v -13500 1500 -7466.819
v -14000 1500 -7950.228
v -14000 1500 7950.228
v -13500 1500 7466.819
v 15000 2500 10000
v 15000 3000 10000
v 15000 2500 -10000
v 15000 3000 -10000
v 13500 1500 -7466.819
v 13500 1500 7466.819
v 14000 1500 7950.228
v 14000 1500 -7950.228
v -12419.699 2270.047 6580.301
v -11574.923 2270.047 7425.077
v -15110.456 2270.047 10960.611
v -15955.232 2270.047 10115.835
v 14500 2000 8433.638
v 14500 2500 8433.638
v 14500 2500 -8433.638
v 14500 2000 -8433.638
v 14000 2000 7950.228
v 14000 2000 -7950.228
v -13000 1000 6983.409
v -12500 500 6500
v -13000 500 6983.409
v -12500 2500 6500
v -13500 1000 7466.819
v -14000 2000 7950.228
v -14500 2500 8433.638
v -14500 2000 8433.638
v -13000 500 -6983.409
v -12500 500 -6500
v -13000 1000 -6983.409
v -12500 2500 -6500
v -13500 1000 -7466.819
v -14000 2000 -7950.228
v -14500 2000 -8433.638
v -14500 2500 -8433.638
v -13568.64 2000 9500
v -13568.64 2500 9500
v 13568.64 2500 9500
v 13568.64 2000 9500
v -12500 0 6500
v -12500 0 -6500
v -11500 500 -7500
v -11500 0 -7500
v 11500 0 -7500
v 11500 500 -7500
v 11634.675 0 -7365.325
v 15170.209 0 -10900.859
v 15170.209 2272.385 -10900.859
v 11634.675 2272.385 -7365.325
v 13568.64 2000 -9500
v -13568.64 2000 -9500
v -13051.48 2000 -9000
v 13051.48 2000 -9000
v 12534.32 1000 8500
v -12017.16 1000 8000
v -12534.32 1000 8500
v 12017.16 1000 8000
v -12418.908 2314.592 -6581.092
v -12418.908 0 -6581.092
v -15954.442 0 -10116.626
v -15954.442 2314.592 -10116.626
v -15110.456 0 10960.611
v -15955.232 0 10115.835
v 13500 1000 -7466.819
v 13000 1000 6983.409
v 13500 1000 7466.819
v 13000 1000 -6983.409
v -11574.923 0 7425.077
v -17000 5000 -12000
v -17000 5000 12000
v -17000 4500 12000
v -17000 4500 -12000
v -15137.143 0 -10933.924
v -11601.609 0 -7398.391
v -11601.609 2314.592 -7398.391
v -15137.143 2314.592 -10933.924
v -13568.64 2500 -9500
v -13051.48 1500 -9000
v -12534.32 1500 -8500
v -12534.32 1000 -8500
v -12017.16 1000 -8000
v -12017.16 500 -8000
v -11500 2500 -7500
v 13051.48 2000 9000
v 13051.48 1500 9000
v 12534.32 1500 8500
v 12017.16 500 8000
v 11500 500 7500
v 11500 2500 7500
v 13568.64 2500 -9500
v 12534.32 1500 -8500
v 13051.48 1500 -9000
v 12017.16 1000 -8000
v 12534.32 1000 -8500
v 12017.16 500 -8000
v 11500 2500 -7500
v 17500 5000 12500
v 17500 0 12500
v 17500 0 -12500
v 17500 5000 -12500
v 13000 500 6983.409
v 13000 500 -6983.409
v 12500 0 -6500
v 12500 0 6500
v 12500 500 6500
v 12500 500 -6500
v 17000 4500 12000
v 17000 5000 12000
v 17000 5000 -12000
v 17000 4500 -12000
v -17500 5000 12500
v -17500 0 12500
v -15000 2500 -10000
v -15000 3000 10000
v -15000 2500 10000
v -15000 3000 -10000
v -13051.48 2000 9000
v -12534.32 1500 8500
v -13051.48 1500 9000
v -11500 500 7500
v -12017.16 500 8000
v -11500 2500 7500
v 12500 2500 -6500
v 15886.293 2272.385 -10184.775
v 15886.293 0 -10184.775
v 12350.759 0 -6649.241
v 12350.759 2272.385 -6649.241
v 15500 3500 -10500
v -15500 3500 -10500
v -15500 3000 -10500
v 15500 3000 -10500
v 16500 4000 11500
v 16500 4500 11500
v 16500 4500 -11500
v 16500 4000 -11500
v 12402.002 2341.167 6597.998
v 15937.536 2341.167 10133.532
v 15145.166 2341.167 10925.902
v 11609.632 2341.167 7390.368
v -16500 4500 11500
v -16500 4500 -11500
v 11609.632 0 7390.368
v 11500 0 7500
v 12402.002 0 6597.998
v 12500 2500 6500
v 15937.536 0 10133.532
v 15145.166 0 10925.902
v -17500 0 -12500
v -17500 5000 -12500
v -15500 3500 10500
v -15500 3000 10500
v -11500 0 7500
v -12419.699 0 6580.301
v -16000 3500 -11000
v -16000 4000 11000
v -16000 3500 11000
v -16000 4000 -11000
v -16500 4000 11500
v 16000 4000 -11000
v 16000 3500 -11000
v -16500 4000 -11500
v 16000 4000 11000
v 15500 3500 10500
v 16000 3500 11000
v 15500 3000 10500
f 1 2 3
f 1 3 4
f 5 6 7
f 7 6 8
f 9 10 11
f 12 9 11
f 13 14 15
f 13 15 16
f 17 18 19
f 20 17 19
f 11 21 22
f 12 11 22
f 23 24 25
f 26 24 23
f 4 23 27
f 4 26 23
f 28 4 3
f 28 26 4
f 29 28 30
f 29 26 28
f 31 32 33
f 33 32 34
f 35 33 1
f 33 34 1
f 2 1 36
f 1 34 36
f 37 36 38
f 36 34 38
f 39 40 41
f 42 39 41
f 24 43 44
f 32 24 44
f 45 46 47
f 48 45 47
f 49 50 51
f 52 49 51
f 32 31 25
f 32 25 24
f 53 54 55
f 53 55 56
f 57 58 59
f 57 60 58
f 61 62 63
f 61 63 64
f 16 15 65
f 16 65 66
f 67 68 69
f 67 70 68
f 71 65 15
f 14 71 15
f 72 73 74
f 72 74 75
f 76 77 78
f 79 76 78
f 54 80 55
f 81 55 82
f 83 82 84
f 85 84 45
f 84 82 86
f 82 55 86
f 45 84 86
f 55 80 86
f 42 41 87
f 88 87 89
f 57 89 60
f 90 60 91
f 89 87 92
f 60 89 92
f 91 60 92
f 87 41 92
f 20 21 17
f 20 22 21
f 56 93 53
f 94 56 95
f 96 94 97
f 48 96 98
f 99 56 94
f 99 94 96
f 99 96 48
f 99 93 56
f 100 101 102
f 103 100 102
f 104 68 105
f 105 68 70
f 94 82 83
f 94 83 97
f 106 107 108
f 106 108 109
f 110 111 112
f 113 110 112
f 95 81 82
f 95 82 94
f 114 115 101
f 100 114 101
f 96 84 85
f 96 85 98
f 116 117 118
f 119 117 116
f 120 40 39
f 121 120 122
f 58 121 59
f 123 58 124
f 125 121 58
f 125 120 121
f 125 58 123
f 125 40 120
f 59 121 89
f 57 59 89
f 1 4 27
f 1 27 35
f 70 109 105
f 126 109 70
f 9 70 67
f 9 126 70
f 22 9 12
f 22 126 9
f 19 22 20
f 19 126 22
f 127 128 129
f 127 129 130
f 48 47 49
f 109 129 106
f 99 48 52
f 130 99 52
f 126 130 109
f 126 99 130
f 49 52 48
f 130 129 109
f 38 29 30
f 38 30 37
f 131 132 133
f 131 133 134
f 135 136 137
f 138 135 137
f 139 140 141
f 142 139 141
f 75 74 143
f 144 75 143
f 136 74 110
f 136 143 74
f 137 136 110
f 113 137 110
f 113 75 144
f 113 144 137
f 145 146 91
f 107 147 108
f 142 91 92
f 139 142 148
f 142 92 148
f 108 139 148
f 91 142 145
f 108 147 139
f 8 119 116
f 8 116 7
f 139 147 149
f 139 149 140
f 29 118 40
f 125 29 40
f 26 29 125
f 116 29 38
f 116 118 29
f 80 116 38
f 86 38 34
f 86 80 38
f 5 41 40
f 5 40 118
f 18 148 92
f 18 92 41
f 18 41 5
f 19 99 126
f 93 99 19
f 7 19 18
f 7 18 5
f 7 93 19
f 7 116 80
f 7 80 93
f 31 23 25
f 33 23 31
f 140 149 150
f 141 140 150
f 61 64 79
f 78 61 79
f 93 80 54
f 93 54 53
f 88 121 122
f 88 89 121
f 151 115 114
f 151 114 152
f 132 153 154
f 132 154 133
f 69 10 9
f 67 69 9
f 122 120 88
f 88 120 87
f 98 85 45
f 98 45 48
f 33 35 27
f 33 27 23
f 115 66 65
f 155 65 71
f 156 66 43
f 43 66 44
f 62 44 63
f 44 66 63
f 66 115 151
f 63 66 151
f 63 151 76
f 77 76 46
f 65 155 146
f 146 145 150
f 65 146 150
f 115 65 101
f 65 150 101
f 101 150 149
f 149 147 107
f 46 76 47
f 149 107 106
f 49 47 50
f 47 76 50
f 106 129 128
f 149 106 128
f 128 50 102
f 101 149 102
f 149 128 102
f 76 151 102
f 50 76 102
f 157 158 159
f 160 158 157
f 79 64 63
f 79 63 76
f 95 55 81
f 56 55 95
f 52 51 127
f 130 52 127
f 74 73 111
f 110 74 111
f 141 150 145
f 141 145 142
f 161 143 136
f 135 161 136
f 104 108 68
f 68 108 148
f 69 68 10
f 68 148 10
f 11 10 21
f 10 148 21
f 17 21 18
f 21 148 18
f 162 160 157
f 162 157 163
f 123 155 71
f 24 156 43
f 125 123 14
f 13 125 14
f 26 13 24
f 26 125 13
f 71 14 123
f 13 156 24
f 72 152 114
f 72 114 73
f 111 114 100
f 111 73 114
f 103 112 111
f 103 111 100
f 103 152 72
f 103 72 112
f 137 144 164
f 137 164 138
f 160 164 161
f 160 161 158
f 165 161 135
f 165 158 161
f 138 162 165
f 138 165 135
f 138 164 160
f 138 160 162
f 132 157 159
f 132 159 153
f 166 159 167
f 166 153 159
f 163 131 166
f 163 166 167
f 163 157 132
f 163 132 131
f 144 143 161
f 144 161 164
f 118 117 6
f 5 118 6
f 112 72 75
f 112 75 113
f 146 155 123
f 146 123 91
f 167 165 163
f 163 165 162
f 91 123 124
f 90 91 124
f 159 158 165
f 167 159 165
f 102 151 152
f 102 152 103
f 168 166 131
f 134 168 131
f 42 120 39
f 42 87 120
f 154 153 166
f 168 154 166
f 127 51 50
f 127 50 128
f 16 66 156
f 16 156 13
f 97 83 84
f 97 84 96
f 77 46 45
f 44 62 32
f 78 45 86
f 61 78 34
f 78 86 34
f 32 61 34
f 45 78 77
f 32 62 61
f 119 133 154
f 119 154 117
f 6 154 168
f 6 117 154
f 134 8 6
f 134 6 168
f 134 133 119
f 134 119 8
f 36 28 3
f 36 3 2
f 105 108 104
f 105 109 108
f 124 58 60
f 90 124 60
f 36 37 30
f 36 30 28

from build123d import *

# Parameters (mm, degrees)
ESQUISSE1_W              = 35000
ESQUISSE1_H              = 25000
ESQUISSE1_W_2            = 25000
ESQUISSE1_H_2            = 15000
BOSS_EXTRU_2_DEPTH       = 5000
ESQUISSE2_W              = 34000
ESQUISSE2_H              = 24000
ENL_V_MAT_EXTRU_1_DEPTH  = 500
ESQUISSE3_W              = 33000
ESQUISSE3_H              = 23000
ENL_V_MAT_EXTRU_2_DEPTH  = 500
ESQUISSE4_W              = 32000
ESQUISSE4_H              = 22000
ENL_V_MAT_EXTRU_3_DEPTH  = 500
ESQUISSE5_W              = 31000
ESQUISSE5_H              = 21000
ENL_V_MAT_EXTRU_4_DEPTH  = 500
ESQUISSE6_W              = 30000
ESQUISSE6_H              = 20000
ENL_V_MAT_EXTRU_5_DEPTH  = 500
ESQUISSE7_W              = 29000
ESQUISSE7_H              = 19000
ENL_V_MAT_EXTRU_6_DEPTH  = 500
ESQUISSE8_W              = 28000
ESQUISSE8_H              = 18000
ENL_V_MAT_EXTRU_7_DEPTH  = 500
ESQUISSE9_W              = 27000
ESQUISSE9_H              = 17000
ENL_V_MAT_EXTRU_8_DEPTH  = 500
ESQUISSE10_W             = 26000
ESQUISSE10_H             = 16000
ENL_V_MAT_EXTRU_9_DEPTH  = 500
BOSS_EXTRU_4_DEPTH       = 2500
ESQUISSE12_W             = 1012.695529181
ESQUISSE12_H             = 2272.385117154
ENL_V_MAT_EXTRU_10_DEPTH = 5000
ESQUISSE13_W             = 1120.580742395
ESQUISSE13_H             = 2341.167166511
ENL_V_MAT_EXTRU_11_DEPTH = 5000
ESQUISSE14_W             = 1194.693774878
ESQUISSE14_H             = 2270.046539735
ENL_V_MAT_EXTRU_12_DEPTH = 5000
ESQUISSE15_W             = 1155.834149298
ESQUISSE15_H             = 2314.592107333
ENL_V_MAT_EXTRU_14_DEPTH = 5000


with BuildPart() as part:
    # Esquisse1 → Boss.-Extru.2 (new body)
    with BuildSketch(Plane(origin=(0, 0, 0), x_dir=(1, 0, 0), z_dir=(0, 1, 0))):
        Rectangle(ESQUISSE1_W, ESQUISSE1_H)
        Rectangle(ESQUISSE1_W_2, ESQUISSE1_H_2, mode=Mode.SUBTRACT)
    extrude(amount=BOSS_EXTRU_2_DEPTH)

    # Esquisse2 → Enlèv. mat.-Extru.1 (cut)
    with BuildSketch(Plane(origin=(0, 5000, 0), x_dir=(1, 0, 0), z_dir=(0, 1, 0))):
        Rectangle(ESQUISSE2_W, ESQUISSE2_H)
    extrude(amount=-ENL_V_MAT_EXTRU_1_DEPTH, mode=Mode.SUBTRACT)

    # Esquisse3 → Enlèv. mat.-Extru.2 (cut)
    with BuildSketch(Plane(origin=(0, 4500, 0), x_dir=(1, 0, 0), z_dir=(0, 1, 0))):
        Rectangle(ESQUISSE3_W, ESQUISSE3_H)
    extrude(amount=-ENL_V_MAT_EXTRU_2_DEPTH, mode=Mode.SUBTRACT)

    # Esquisse4 → Enlèv. mat.-Extru.3 (cut)
    with BuildSketch(Plane(origin=(0, 4000, 0), x_dir=(1, 0, 0), z_dir=(0, 1, 0))):
        Rectangle(ESQUISSE4_W, ESQUISSE4_H)
    extrude(amount=-ENL_V_MAT_EXTRU_3_DEPTH, mode=Mode.SUBTRACT)

    # Esquisse5 → Enlèv. mat.-Extru.4 (cut)
    with BuildSketch(Plane(origin=(0, 3500, 0), x_dir=(1, 0, 0), z_dir=(0, 1, 0))):
        Rectangle(ESQUISSE5_W, ESQUISSE5_H)
    extrude(amount=-ENL_V_MAT_EXTRU_4_DEPTH, mode=Mode.SUBTRACT)

    # Esquisse6 → Enlèv. mat.-Extru.5 (cut)
    with BuildSketch(Plane(origin=(0, 3000, 0), x_dir=(1, 0, 0), z_dir=(0, 1, 0))):
        Rectangle(ESQUISSE6_W, ESQUISSE6_H)
    extrude(amount=-ENL_V_MAT_EXTRU_5_DEPTH, mode=Mode.SUBTRACT)

    # Esquisse7 → Enlèv. mat.-Extru.6 (cut)
    with BuildSketch(Plane(origin=(0, 2500, 0), x_dir=(1, 0, 0), z_dir=(0, 1, 0))):
        Rectangle(ESQUISSE7_W, ESQUISSE7_H)
    extrude(amount=-ENL_V_MAT_EXTRU_6_DEPTH, mode=Mode.SUBTRACT)

    # Esquisse8 → Enlèv. mat.-Extru.7 (cut)
    with BuildSketch(Plane(origin=(0, 2000, 0), x_dir=(1, 0, 0), z_dir=(0, 1, 0))):
        Rectangle(ESQUISSE8_W, ESQUISSE8_H)
    extrude(amount=-ENL_V_MAT_EXTRU_7_DEPTH, mode=Mode.SUBTRACT)

    # Esquisse9 → Enlèv. mat.-Extru.8 (cut)
    with BuildSketch(Plane(origin=(0, 1500, 0), x_dir=(1, 0, 0), z_dir=(0, 1, 0))):
        Rectangle(ESQUISSE9_W, ESQUISSE9_H)
    extrude(amount=-ENL_V_MAT_EXTRU_8_DEPTH, mode=Mode.SUBTRACT)

    # Esquisse10 → Enlèv. mat.-Extru.9 (cut)
    with BuildSketch(Plane(origin=(0, 1000, 0), x_dir=(1, 0, 0), z_dir=(0, 1, 0))):
        Rectangle(ESQUISSE10_W, ESQUISSE10_H)
    extrude(amount=-ENL_V_MAT_EXTRU_9_DEPTH, mode=Mode.SUBTRACT)

    # Esquisse11 → Boss.-Extru.4 (add)
    with BuildSketch(Plane(origin=(0, 2500, 0), x_dir=(1, 0, 0), z_dir=(0, 1, 0))):
        Polygon((-12500, -6500), (-17000, -10850.685111022), (-16154.439354551, -12000), (-11500, -7500), align=None)
        Polygon((-17000, 10850.685111022), (-16154.439354551, 12000), (-11500, 7500), (-12500, 6500), align=None)
        Polygon((12500, 6500), (17000, 10850.685111022), (16154.439354551, 12000), (11500, 7500), align=None)
        Polygon((17000, -10850.685111022), (16154.439354551, -12000), (11500, -7500), (12500, -6500), align=None)
    extrude(amount=-BOSS_EXTRU_4_DEPTH)

    # Esquisse12 → Enlèv. mat.-Extru.10 (cut)
    with BuildSketch(Plane(origin=(9500, 0, -9500), x_dir=(0.707106781, 0, 0.707106781), z_dir=(-0.707106781, 0, 0.707106781))):
        with Locations((3525.233881406, 1136.192558577)):
            Rectangle(ESQUISSE12_W, ESQUISSE12_H)
    extrude(amount=-ENL_V_MAT_EXTRU_10_DEPTH, mode=Mode.SUBTRACT)

    # Esquisse13 → Enlèv. mat.-Extru.11 (cut)
    with BuildSketch(Plane(origin=(9500, 0, 9500), x_dir=(-0.707106781, 0, 0.707106781), z_dir=(-0.707106781, 0, -0.707106781))):
        with Locations((-3543.76036393, 1170.583583256)):
            Rectangle(ESQUISSE13_W, ESQUISSE13_H)
    extrude(amount=-ENL_V_MAT_EXTRU_11_DEPTH, mode=Mode.SUBTRACT)

    # Esquisse14 → Enlèv. mat.-Extru.12 (cut)
    with BuildSketch(Plane(origin=(-9500, 0, 9500), x_dir=(-0.707106781, 0, -0.707106781), z_dir=(0.707106781, 0, -0.707106781))):
        with Locations((3531.730445489, 1135.023269868)):
            Rectangle(ESQUISSE14_W, ESQUISSE14_H)
    extrude(amount=-ENL_V_MAT_EXTRU_12_DEPTH, mode=Mode.SUBTRACT)

    # Esquisse15 → Enlèv. mat.-Extru.14 (cut)
    with BuildSketch(Plane(origin=(-9500, 0, -9500), x_dir=(0.707106781, 0, -0.707106781), z_dir=(0.707106781, 0, 0.707106781))):
        with Locations((-3550.041670603, 1157.296053667)):
            Rectangle(ESQUISSE15_W, ESQUISSE15_H)
    extrude(amount=-ENL_V_MAT_EXTRU_14_DEPTH, mode=Mode.SUBTRACT)


solid = part.part
